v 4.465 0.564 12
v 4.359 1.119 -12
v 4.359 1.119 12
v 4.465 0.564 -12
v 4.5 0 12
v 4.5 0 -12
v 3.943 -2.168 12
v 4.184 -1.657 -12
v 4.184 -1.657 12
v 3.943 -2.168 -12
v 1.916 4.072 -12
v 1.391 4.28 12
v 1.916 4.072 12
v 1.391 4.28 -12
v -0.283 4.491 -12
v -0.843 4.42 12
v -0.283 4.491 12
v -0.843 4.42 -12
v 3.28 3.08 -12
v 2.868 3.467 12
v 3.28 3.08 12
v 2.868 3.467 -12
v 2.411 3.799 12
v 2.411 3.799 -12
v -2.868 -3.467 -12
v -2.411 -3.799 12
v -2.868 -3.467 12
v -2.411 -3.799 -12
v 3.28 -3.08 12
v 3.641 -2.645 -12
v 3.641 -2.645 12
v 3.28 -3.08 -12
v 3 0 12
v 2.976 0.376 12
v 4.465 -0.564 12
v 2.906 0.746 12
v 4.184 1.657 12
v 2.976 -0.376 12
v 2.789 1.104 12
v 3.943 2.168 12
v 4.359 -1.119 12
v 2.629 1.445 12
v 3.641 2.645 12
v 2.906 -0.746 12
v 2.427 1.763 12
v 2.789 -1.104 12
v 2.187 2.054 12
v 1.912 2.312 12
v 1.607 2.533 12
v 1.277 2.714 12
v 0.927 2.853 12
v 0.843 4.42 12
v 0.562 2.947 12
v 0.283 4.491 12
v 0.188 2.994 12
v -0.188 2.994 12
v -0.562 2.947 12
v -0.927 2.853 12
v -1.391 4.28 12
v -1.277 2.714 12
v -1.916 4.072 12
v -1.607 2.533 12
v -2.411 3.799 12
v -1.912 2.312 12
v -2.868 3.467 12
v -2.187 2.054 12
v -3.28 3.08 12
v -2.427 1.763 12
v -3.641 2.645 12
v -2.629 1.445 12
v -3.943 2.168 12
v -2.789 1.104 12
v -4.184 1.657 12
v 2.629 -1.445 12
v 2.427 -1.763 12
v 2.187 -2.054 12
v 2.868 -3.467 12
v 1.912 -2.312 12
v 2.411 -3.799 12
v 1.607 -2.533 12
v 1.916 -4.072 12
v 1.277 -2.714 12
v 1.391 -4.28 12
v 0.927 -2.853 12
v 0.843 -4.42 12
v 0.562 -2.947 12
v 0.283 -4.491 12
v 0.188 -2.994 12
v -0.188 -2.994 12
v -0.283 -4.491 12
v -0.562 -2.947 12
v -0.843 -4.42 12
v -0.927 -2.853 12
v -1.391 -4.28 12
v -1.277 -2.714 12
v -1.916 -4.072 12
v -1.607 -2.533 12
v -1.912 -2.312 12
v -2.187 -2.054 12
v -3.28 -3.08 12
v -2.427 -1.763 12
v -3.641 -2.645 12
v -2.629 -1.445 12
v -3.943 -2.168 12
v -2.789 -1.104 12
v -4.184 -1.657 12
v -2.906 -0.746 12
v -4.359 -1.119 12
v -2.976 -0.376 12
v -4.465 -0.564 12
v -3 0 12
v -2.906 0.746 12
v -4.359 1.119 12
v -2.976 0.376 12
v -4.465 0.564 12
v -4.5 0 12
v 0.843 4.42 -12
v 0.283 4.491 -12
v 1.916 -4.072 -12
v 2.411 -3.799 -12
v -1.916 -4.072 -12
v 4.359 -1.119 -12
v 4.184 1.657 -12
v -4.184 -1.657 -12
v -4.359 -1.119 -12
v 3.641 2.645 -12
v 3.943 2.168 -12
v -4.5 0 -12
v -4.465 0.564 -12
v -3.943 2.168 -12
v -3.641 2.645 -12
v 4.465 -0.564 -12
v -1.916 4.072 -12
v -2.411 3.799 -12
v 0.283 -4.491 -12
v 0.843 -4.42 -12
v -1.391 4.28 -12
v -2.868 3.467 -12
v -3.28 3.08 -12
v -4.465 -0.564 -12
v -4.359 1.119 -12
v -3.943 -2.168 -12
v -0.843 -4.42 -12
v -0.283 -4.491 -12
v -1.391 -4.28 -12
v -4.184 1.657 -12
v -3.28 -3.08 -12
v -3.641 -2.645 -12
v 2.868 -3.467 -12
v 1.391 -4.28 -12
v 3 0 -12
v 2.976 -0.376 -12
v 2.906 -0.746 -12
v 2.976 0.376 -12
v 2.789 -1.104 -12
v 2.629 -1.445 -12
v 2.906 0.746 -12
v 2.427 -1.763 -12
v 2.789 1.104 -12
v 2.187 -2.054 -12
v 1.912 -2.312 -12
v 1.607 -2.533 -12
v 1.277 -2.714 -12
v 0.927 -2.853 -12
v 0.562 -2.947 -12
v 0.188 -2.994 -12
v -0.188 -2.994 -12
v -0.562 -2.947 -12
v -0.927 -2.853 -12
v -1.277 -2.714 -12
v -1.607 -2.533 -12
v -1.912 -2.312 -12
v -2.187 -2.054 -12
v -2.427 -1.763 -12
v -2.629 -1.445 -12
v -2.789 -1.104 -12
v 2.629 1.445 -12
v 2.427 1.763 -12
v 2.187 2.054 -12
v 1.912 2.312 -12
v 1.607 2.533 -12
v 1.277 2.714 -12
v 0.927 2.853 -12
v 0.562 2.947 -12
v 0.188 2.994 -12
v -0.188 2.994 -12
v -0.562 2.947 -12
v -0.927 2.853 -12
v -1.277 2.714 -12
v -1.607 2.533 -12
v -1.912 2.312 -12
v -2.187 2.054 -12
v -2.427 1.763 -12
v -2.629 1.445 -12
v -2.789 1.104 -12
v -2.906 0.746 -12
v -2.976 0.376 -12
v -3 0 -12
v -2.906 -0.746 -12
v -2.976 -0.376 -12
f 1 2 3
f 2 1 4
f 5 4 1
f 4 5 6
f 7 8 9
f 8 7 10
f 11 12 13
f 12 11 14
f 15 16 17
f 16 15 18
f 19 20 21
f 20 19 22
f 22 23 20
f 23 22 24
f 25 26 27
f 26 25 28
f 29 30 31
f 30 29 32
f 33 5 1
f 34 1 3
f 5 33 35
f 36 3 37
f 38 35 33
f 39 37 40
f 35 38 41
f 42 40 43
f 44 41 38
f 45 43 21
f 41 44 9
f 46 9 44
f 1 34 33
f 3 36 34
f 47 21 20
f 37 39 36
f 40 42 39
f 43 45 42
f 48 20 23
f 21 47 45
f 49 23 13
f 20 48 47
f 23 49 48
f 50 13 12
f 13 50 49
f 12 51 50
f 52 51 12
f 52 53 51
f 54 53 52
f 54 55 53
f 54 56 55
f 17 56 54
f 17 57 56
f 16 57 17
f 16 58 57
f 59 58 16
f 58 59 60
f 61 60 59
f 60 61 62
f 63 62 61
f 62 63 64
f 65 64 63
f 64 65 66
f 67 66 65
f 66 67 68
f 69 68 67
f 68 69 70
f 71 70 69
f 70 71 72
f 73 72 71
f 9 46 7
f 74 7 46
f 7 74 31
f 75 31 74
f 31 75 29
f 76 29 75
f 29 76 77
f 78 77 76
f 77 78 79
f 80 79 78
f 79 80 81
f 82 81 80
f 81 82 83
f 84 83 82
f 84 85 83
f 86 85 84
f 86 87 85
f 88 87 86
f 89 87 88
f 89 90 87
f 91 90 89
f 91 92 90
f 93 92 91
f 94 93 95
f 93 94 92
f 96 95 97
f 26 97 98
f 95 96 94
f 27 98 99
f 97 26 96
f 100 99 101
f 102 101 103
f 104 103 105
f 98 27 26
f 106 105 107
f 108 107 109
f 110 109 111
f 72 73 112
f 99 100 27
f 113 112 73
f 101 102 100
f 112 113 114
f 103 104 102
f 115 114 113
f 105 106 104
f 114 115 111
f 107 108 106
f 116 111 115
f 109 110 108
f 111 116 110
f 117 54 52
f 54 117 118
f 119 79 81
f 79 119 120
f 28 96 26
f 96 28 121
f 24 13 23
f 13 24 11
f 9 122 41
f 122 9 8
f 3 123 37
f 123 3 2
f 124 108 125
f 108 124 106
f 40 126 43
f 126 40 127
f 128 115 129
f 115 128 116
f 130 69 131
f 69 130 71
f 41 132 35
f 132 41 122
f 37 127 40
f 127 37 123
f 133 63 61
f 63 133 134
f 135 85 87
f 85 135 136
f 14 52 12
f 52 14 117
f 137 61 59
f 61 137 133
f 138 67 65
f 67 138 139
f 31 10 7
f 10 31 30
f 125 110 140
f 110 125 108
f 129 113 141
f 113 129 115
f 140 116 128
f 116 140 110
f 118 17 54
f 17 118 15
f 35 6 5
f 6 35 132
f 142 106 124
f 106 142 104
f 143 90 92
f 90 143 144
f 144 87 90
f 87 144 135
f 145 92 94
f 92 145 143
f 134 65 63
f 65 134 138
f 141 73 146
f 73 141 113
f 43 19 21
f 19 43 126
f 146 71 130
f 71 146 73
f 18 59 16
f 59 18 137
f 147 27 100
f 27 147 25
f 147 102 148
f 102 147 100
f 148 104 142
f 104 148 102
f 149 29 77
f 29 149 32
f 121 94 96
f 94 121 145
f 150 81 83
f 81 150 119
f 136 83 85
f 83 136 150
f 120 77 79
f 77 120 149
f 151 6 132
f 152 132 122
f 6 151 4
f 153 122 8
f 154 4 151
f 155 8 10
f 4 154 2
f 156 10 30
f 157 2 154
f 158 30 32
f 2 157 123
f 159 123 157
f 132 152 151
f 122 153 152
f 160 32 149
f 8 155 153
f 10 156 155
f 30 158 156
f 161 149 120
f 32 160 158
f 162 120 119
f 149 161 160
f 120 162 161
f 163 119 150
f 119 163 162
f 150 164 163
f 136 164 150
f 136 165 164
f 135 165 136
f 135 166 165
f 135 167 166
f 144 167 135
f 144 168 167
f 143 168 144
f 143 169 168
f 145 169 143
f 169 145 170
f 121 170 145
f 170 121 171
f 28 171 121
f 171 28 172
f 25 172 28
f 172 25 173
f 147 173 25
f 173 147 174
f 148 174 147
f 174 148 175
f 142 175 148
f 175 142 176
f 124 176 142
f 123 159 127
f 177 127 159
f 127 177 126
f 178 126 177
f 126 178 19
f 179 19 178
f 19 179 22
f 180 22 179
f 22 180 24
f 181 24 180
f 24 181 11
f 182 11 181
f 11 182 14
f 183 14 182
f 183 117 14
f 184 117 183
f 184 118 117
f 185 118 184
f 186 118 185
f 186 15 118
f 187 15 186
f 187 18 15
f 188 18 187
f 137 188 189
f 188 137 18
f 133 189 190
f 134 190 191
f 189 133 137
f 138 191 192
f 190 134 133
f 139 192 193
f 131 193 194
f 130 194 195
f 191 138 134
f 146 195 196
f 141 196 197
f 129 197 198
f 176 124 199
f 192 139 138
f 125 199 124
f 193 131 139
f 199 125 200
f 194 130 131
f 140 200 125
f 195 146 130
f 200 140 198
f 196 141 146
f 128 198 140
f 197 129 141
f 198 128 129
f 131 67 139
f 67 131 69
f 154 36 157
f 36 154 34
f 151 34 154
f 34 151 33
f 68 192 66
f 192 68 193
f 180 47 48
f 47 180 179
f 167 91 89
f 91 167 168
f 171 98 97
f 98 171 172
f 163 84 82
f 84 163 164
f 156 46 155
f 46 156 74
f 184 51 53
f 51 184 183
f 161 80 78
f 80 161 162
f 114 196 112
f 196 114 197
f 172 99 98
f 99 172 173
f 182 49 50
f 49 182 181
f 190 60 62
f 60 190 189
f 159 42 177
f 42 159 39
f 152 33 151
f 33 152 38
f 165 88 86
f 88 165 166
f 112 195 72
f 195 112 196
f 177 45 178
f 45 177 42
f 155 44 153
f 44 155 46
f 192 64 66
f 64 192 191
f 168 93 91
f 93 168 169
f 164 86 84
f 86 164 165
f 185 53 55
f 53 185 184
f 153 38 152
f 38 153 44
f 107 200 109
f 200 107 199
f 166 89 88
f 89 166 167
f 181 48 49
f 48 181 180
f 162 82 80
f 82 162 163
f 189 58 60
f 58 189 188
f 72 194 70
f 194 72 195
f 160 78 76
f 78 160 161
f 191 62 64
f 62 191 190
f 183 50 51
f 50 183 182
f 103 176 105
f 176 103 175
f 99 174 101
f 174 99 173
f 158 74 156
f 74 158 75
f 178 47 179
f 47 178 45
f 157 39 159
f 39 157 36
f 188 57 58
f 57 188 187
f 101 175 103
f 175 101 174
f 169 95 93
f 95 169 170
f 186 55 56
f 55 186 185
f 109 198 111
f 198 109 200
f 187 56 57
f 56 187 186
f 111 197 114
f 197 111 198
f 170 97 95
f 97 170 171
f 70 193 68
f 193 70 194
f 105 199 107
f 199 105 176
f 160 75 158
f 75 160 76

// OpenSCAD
$fn = 50;


difference() {
	union() {
		translate(v = [0, 0, -12.0000000000]) {
			cylinder(h = 24, r = 4.5000000000);
		}
	}
	union() {
		translate(v = [0, 0, -100.0000000000]) {
			cylinder(h = 200, r = 3.0000000000);
		}
	}
}
